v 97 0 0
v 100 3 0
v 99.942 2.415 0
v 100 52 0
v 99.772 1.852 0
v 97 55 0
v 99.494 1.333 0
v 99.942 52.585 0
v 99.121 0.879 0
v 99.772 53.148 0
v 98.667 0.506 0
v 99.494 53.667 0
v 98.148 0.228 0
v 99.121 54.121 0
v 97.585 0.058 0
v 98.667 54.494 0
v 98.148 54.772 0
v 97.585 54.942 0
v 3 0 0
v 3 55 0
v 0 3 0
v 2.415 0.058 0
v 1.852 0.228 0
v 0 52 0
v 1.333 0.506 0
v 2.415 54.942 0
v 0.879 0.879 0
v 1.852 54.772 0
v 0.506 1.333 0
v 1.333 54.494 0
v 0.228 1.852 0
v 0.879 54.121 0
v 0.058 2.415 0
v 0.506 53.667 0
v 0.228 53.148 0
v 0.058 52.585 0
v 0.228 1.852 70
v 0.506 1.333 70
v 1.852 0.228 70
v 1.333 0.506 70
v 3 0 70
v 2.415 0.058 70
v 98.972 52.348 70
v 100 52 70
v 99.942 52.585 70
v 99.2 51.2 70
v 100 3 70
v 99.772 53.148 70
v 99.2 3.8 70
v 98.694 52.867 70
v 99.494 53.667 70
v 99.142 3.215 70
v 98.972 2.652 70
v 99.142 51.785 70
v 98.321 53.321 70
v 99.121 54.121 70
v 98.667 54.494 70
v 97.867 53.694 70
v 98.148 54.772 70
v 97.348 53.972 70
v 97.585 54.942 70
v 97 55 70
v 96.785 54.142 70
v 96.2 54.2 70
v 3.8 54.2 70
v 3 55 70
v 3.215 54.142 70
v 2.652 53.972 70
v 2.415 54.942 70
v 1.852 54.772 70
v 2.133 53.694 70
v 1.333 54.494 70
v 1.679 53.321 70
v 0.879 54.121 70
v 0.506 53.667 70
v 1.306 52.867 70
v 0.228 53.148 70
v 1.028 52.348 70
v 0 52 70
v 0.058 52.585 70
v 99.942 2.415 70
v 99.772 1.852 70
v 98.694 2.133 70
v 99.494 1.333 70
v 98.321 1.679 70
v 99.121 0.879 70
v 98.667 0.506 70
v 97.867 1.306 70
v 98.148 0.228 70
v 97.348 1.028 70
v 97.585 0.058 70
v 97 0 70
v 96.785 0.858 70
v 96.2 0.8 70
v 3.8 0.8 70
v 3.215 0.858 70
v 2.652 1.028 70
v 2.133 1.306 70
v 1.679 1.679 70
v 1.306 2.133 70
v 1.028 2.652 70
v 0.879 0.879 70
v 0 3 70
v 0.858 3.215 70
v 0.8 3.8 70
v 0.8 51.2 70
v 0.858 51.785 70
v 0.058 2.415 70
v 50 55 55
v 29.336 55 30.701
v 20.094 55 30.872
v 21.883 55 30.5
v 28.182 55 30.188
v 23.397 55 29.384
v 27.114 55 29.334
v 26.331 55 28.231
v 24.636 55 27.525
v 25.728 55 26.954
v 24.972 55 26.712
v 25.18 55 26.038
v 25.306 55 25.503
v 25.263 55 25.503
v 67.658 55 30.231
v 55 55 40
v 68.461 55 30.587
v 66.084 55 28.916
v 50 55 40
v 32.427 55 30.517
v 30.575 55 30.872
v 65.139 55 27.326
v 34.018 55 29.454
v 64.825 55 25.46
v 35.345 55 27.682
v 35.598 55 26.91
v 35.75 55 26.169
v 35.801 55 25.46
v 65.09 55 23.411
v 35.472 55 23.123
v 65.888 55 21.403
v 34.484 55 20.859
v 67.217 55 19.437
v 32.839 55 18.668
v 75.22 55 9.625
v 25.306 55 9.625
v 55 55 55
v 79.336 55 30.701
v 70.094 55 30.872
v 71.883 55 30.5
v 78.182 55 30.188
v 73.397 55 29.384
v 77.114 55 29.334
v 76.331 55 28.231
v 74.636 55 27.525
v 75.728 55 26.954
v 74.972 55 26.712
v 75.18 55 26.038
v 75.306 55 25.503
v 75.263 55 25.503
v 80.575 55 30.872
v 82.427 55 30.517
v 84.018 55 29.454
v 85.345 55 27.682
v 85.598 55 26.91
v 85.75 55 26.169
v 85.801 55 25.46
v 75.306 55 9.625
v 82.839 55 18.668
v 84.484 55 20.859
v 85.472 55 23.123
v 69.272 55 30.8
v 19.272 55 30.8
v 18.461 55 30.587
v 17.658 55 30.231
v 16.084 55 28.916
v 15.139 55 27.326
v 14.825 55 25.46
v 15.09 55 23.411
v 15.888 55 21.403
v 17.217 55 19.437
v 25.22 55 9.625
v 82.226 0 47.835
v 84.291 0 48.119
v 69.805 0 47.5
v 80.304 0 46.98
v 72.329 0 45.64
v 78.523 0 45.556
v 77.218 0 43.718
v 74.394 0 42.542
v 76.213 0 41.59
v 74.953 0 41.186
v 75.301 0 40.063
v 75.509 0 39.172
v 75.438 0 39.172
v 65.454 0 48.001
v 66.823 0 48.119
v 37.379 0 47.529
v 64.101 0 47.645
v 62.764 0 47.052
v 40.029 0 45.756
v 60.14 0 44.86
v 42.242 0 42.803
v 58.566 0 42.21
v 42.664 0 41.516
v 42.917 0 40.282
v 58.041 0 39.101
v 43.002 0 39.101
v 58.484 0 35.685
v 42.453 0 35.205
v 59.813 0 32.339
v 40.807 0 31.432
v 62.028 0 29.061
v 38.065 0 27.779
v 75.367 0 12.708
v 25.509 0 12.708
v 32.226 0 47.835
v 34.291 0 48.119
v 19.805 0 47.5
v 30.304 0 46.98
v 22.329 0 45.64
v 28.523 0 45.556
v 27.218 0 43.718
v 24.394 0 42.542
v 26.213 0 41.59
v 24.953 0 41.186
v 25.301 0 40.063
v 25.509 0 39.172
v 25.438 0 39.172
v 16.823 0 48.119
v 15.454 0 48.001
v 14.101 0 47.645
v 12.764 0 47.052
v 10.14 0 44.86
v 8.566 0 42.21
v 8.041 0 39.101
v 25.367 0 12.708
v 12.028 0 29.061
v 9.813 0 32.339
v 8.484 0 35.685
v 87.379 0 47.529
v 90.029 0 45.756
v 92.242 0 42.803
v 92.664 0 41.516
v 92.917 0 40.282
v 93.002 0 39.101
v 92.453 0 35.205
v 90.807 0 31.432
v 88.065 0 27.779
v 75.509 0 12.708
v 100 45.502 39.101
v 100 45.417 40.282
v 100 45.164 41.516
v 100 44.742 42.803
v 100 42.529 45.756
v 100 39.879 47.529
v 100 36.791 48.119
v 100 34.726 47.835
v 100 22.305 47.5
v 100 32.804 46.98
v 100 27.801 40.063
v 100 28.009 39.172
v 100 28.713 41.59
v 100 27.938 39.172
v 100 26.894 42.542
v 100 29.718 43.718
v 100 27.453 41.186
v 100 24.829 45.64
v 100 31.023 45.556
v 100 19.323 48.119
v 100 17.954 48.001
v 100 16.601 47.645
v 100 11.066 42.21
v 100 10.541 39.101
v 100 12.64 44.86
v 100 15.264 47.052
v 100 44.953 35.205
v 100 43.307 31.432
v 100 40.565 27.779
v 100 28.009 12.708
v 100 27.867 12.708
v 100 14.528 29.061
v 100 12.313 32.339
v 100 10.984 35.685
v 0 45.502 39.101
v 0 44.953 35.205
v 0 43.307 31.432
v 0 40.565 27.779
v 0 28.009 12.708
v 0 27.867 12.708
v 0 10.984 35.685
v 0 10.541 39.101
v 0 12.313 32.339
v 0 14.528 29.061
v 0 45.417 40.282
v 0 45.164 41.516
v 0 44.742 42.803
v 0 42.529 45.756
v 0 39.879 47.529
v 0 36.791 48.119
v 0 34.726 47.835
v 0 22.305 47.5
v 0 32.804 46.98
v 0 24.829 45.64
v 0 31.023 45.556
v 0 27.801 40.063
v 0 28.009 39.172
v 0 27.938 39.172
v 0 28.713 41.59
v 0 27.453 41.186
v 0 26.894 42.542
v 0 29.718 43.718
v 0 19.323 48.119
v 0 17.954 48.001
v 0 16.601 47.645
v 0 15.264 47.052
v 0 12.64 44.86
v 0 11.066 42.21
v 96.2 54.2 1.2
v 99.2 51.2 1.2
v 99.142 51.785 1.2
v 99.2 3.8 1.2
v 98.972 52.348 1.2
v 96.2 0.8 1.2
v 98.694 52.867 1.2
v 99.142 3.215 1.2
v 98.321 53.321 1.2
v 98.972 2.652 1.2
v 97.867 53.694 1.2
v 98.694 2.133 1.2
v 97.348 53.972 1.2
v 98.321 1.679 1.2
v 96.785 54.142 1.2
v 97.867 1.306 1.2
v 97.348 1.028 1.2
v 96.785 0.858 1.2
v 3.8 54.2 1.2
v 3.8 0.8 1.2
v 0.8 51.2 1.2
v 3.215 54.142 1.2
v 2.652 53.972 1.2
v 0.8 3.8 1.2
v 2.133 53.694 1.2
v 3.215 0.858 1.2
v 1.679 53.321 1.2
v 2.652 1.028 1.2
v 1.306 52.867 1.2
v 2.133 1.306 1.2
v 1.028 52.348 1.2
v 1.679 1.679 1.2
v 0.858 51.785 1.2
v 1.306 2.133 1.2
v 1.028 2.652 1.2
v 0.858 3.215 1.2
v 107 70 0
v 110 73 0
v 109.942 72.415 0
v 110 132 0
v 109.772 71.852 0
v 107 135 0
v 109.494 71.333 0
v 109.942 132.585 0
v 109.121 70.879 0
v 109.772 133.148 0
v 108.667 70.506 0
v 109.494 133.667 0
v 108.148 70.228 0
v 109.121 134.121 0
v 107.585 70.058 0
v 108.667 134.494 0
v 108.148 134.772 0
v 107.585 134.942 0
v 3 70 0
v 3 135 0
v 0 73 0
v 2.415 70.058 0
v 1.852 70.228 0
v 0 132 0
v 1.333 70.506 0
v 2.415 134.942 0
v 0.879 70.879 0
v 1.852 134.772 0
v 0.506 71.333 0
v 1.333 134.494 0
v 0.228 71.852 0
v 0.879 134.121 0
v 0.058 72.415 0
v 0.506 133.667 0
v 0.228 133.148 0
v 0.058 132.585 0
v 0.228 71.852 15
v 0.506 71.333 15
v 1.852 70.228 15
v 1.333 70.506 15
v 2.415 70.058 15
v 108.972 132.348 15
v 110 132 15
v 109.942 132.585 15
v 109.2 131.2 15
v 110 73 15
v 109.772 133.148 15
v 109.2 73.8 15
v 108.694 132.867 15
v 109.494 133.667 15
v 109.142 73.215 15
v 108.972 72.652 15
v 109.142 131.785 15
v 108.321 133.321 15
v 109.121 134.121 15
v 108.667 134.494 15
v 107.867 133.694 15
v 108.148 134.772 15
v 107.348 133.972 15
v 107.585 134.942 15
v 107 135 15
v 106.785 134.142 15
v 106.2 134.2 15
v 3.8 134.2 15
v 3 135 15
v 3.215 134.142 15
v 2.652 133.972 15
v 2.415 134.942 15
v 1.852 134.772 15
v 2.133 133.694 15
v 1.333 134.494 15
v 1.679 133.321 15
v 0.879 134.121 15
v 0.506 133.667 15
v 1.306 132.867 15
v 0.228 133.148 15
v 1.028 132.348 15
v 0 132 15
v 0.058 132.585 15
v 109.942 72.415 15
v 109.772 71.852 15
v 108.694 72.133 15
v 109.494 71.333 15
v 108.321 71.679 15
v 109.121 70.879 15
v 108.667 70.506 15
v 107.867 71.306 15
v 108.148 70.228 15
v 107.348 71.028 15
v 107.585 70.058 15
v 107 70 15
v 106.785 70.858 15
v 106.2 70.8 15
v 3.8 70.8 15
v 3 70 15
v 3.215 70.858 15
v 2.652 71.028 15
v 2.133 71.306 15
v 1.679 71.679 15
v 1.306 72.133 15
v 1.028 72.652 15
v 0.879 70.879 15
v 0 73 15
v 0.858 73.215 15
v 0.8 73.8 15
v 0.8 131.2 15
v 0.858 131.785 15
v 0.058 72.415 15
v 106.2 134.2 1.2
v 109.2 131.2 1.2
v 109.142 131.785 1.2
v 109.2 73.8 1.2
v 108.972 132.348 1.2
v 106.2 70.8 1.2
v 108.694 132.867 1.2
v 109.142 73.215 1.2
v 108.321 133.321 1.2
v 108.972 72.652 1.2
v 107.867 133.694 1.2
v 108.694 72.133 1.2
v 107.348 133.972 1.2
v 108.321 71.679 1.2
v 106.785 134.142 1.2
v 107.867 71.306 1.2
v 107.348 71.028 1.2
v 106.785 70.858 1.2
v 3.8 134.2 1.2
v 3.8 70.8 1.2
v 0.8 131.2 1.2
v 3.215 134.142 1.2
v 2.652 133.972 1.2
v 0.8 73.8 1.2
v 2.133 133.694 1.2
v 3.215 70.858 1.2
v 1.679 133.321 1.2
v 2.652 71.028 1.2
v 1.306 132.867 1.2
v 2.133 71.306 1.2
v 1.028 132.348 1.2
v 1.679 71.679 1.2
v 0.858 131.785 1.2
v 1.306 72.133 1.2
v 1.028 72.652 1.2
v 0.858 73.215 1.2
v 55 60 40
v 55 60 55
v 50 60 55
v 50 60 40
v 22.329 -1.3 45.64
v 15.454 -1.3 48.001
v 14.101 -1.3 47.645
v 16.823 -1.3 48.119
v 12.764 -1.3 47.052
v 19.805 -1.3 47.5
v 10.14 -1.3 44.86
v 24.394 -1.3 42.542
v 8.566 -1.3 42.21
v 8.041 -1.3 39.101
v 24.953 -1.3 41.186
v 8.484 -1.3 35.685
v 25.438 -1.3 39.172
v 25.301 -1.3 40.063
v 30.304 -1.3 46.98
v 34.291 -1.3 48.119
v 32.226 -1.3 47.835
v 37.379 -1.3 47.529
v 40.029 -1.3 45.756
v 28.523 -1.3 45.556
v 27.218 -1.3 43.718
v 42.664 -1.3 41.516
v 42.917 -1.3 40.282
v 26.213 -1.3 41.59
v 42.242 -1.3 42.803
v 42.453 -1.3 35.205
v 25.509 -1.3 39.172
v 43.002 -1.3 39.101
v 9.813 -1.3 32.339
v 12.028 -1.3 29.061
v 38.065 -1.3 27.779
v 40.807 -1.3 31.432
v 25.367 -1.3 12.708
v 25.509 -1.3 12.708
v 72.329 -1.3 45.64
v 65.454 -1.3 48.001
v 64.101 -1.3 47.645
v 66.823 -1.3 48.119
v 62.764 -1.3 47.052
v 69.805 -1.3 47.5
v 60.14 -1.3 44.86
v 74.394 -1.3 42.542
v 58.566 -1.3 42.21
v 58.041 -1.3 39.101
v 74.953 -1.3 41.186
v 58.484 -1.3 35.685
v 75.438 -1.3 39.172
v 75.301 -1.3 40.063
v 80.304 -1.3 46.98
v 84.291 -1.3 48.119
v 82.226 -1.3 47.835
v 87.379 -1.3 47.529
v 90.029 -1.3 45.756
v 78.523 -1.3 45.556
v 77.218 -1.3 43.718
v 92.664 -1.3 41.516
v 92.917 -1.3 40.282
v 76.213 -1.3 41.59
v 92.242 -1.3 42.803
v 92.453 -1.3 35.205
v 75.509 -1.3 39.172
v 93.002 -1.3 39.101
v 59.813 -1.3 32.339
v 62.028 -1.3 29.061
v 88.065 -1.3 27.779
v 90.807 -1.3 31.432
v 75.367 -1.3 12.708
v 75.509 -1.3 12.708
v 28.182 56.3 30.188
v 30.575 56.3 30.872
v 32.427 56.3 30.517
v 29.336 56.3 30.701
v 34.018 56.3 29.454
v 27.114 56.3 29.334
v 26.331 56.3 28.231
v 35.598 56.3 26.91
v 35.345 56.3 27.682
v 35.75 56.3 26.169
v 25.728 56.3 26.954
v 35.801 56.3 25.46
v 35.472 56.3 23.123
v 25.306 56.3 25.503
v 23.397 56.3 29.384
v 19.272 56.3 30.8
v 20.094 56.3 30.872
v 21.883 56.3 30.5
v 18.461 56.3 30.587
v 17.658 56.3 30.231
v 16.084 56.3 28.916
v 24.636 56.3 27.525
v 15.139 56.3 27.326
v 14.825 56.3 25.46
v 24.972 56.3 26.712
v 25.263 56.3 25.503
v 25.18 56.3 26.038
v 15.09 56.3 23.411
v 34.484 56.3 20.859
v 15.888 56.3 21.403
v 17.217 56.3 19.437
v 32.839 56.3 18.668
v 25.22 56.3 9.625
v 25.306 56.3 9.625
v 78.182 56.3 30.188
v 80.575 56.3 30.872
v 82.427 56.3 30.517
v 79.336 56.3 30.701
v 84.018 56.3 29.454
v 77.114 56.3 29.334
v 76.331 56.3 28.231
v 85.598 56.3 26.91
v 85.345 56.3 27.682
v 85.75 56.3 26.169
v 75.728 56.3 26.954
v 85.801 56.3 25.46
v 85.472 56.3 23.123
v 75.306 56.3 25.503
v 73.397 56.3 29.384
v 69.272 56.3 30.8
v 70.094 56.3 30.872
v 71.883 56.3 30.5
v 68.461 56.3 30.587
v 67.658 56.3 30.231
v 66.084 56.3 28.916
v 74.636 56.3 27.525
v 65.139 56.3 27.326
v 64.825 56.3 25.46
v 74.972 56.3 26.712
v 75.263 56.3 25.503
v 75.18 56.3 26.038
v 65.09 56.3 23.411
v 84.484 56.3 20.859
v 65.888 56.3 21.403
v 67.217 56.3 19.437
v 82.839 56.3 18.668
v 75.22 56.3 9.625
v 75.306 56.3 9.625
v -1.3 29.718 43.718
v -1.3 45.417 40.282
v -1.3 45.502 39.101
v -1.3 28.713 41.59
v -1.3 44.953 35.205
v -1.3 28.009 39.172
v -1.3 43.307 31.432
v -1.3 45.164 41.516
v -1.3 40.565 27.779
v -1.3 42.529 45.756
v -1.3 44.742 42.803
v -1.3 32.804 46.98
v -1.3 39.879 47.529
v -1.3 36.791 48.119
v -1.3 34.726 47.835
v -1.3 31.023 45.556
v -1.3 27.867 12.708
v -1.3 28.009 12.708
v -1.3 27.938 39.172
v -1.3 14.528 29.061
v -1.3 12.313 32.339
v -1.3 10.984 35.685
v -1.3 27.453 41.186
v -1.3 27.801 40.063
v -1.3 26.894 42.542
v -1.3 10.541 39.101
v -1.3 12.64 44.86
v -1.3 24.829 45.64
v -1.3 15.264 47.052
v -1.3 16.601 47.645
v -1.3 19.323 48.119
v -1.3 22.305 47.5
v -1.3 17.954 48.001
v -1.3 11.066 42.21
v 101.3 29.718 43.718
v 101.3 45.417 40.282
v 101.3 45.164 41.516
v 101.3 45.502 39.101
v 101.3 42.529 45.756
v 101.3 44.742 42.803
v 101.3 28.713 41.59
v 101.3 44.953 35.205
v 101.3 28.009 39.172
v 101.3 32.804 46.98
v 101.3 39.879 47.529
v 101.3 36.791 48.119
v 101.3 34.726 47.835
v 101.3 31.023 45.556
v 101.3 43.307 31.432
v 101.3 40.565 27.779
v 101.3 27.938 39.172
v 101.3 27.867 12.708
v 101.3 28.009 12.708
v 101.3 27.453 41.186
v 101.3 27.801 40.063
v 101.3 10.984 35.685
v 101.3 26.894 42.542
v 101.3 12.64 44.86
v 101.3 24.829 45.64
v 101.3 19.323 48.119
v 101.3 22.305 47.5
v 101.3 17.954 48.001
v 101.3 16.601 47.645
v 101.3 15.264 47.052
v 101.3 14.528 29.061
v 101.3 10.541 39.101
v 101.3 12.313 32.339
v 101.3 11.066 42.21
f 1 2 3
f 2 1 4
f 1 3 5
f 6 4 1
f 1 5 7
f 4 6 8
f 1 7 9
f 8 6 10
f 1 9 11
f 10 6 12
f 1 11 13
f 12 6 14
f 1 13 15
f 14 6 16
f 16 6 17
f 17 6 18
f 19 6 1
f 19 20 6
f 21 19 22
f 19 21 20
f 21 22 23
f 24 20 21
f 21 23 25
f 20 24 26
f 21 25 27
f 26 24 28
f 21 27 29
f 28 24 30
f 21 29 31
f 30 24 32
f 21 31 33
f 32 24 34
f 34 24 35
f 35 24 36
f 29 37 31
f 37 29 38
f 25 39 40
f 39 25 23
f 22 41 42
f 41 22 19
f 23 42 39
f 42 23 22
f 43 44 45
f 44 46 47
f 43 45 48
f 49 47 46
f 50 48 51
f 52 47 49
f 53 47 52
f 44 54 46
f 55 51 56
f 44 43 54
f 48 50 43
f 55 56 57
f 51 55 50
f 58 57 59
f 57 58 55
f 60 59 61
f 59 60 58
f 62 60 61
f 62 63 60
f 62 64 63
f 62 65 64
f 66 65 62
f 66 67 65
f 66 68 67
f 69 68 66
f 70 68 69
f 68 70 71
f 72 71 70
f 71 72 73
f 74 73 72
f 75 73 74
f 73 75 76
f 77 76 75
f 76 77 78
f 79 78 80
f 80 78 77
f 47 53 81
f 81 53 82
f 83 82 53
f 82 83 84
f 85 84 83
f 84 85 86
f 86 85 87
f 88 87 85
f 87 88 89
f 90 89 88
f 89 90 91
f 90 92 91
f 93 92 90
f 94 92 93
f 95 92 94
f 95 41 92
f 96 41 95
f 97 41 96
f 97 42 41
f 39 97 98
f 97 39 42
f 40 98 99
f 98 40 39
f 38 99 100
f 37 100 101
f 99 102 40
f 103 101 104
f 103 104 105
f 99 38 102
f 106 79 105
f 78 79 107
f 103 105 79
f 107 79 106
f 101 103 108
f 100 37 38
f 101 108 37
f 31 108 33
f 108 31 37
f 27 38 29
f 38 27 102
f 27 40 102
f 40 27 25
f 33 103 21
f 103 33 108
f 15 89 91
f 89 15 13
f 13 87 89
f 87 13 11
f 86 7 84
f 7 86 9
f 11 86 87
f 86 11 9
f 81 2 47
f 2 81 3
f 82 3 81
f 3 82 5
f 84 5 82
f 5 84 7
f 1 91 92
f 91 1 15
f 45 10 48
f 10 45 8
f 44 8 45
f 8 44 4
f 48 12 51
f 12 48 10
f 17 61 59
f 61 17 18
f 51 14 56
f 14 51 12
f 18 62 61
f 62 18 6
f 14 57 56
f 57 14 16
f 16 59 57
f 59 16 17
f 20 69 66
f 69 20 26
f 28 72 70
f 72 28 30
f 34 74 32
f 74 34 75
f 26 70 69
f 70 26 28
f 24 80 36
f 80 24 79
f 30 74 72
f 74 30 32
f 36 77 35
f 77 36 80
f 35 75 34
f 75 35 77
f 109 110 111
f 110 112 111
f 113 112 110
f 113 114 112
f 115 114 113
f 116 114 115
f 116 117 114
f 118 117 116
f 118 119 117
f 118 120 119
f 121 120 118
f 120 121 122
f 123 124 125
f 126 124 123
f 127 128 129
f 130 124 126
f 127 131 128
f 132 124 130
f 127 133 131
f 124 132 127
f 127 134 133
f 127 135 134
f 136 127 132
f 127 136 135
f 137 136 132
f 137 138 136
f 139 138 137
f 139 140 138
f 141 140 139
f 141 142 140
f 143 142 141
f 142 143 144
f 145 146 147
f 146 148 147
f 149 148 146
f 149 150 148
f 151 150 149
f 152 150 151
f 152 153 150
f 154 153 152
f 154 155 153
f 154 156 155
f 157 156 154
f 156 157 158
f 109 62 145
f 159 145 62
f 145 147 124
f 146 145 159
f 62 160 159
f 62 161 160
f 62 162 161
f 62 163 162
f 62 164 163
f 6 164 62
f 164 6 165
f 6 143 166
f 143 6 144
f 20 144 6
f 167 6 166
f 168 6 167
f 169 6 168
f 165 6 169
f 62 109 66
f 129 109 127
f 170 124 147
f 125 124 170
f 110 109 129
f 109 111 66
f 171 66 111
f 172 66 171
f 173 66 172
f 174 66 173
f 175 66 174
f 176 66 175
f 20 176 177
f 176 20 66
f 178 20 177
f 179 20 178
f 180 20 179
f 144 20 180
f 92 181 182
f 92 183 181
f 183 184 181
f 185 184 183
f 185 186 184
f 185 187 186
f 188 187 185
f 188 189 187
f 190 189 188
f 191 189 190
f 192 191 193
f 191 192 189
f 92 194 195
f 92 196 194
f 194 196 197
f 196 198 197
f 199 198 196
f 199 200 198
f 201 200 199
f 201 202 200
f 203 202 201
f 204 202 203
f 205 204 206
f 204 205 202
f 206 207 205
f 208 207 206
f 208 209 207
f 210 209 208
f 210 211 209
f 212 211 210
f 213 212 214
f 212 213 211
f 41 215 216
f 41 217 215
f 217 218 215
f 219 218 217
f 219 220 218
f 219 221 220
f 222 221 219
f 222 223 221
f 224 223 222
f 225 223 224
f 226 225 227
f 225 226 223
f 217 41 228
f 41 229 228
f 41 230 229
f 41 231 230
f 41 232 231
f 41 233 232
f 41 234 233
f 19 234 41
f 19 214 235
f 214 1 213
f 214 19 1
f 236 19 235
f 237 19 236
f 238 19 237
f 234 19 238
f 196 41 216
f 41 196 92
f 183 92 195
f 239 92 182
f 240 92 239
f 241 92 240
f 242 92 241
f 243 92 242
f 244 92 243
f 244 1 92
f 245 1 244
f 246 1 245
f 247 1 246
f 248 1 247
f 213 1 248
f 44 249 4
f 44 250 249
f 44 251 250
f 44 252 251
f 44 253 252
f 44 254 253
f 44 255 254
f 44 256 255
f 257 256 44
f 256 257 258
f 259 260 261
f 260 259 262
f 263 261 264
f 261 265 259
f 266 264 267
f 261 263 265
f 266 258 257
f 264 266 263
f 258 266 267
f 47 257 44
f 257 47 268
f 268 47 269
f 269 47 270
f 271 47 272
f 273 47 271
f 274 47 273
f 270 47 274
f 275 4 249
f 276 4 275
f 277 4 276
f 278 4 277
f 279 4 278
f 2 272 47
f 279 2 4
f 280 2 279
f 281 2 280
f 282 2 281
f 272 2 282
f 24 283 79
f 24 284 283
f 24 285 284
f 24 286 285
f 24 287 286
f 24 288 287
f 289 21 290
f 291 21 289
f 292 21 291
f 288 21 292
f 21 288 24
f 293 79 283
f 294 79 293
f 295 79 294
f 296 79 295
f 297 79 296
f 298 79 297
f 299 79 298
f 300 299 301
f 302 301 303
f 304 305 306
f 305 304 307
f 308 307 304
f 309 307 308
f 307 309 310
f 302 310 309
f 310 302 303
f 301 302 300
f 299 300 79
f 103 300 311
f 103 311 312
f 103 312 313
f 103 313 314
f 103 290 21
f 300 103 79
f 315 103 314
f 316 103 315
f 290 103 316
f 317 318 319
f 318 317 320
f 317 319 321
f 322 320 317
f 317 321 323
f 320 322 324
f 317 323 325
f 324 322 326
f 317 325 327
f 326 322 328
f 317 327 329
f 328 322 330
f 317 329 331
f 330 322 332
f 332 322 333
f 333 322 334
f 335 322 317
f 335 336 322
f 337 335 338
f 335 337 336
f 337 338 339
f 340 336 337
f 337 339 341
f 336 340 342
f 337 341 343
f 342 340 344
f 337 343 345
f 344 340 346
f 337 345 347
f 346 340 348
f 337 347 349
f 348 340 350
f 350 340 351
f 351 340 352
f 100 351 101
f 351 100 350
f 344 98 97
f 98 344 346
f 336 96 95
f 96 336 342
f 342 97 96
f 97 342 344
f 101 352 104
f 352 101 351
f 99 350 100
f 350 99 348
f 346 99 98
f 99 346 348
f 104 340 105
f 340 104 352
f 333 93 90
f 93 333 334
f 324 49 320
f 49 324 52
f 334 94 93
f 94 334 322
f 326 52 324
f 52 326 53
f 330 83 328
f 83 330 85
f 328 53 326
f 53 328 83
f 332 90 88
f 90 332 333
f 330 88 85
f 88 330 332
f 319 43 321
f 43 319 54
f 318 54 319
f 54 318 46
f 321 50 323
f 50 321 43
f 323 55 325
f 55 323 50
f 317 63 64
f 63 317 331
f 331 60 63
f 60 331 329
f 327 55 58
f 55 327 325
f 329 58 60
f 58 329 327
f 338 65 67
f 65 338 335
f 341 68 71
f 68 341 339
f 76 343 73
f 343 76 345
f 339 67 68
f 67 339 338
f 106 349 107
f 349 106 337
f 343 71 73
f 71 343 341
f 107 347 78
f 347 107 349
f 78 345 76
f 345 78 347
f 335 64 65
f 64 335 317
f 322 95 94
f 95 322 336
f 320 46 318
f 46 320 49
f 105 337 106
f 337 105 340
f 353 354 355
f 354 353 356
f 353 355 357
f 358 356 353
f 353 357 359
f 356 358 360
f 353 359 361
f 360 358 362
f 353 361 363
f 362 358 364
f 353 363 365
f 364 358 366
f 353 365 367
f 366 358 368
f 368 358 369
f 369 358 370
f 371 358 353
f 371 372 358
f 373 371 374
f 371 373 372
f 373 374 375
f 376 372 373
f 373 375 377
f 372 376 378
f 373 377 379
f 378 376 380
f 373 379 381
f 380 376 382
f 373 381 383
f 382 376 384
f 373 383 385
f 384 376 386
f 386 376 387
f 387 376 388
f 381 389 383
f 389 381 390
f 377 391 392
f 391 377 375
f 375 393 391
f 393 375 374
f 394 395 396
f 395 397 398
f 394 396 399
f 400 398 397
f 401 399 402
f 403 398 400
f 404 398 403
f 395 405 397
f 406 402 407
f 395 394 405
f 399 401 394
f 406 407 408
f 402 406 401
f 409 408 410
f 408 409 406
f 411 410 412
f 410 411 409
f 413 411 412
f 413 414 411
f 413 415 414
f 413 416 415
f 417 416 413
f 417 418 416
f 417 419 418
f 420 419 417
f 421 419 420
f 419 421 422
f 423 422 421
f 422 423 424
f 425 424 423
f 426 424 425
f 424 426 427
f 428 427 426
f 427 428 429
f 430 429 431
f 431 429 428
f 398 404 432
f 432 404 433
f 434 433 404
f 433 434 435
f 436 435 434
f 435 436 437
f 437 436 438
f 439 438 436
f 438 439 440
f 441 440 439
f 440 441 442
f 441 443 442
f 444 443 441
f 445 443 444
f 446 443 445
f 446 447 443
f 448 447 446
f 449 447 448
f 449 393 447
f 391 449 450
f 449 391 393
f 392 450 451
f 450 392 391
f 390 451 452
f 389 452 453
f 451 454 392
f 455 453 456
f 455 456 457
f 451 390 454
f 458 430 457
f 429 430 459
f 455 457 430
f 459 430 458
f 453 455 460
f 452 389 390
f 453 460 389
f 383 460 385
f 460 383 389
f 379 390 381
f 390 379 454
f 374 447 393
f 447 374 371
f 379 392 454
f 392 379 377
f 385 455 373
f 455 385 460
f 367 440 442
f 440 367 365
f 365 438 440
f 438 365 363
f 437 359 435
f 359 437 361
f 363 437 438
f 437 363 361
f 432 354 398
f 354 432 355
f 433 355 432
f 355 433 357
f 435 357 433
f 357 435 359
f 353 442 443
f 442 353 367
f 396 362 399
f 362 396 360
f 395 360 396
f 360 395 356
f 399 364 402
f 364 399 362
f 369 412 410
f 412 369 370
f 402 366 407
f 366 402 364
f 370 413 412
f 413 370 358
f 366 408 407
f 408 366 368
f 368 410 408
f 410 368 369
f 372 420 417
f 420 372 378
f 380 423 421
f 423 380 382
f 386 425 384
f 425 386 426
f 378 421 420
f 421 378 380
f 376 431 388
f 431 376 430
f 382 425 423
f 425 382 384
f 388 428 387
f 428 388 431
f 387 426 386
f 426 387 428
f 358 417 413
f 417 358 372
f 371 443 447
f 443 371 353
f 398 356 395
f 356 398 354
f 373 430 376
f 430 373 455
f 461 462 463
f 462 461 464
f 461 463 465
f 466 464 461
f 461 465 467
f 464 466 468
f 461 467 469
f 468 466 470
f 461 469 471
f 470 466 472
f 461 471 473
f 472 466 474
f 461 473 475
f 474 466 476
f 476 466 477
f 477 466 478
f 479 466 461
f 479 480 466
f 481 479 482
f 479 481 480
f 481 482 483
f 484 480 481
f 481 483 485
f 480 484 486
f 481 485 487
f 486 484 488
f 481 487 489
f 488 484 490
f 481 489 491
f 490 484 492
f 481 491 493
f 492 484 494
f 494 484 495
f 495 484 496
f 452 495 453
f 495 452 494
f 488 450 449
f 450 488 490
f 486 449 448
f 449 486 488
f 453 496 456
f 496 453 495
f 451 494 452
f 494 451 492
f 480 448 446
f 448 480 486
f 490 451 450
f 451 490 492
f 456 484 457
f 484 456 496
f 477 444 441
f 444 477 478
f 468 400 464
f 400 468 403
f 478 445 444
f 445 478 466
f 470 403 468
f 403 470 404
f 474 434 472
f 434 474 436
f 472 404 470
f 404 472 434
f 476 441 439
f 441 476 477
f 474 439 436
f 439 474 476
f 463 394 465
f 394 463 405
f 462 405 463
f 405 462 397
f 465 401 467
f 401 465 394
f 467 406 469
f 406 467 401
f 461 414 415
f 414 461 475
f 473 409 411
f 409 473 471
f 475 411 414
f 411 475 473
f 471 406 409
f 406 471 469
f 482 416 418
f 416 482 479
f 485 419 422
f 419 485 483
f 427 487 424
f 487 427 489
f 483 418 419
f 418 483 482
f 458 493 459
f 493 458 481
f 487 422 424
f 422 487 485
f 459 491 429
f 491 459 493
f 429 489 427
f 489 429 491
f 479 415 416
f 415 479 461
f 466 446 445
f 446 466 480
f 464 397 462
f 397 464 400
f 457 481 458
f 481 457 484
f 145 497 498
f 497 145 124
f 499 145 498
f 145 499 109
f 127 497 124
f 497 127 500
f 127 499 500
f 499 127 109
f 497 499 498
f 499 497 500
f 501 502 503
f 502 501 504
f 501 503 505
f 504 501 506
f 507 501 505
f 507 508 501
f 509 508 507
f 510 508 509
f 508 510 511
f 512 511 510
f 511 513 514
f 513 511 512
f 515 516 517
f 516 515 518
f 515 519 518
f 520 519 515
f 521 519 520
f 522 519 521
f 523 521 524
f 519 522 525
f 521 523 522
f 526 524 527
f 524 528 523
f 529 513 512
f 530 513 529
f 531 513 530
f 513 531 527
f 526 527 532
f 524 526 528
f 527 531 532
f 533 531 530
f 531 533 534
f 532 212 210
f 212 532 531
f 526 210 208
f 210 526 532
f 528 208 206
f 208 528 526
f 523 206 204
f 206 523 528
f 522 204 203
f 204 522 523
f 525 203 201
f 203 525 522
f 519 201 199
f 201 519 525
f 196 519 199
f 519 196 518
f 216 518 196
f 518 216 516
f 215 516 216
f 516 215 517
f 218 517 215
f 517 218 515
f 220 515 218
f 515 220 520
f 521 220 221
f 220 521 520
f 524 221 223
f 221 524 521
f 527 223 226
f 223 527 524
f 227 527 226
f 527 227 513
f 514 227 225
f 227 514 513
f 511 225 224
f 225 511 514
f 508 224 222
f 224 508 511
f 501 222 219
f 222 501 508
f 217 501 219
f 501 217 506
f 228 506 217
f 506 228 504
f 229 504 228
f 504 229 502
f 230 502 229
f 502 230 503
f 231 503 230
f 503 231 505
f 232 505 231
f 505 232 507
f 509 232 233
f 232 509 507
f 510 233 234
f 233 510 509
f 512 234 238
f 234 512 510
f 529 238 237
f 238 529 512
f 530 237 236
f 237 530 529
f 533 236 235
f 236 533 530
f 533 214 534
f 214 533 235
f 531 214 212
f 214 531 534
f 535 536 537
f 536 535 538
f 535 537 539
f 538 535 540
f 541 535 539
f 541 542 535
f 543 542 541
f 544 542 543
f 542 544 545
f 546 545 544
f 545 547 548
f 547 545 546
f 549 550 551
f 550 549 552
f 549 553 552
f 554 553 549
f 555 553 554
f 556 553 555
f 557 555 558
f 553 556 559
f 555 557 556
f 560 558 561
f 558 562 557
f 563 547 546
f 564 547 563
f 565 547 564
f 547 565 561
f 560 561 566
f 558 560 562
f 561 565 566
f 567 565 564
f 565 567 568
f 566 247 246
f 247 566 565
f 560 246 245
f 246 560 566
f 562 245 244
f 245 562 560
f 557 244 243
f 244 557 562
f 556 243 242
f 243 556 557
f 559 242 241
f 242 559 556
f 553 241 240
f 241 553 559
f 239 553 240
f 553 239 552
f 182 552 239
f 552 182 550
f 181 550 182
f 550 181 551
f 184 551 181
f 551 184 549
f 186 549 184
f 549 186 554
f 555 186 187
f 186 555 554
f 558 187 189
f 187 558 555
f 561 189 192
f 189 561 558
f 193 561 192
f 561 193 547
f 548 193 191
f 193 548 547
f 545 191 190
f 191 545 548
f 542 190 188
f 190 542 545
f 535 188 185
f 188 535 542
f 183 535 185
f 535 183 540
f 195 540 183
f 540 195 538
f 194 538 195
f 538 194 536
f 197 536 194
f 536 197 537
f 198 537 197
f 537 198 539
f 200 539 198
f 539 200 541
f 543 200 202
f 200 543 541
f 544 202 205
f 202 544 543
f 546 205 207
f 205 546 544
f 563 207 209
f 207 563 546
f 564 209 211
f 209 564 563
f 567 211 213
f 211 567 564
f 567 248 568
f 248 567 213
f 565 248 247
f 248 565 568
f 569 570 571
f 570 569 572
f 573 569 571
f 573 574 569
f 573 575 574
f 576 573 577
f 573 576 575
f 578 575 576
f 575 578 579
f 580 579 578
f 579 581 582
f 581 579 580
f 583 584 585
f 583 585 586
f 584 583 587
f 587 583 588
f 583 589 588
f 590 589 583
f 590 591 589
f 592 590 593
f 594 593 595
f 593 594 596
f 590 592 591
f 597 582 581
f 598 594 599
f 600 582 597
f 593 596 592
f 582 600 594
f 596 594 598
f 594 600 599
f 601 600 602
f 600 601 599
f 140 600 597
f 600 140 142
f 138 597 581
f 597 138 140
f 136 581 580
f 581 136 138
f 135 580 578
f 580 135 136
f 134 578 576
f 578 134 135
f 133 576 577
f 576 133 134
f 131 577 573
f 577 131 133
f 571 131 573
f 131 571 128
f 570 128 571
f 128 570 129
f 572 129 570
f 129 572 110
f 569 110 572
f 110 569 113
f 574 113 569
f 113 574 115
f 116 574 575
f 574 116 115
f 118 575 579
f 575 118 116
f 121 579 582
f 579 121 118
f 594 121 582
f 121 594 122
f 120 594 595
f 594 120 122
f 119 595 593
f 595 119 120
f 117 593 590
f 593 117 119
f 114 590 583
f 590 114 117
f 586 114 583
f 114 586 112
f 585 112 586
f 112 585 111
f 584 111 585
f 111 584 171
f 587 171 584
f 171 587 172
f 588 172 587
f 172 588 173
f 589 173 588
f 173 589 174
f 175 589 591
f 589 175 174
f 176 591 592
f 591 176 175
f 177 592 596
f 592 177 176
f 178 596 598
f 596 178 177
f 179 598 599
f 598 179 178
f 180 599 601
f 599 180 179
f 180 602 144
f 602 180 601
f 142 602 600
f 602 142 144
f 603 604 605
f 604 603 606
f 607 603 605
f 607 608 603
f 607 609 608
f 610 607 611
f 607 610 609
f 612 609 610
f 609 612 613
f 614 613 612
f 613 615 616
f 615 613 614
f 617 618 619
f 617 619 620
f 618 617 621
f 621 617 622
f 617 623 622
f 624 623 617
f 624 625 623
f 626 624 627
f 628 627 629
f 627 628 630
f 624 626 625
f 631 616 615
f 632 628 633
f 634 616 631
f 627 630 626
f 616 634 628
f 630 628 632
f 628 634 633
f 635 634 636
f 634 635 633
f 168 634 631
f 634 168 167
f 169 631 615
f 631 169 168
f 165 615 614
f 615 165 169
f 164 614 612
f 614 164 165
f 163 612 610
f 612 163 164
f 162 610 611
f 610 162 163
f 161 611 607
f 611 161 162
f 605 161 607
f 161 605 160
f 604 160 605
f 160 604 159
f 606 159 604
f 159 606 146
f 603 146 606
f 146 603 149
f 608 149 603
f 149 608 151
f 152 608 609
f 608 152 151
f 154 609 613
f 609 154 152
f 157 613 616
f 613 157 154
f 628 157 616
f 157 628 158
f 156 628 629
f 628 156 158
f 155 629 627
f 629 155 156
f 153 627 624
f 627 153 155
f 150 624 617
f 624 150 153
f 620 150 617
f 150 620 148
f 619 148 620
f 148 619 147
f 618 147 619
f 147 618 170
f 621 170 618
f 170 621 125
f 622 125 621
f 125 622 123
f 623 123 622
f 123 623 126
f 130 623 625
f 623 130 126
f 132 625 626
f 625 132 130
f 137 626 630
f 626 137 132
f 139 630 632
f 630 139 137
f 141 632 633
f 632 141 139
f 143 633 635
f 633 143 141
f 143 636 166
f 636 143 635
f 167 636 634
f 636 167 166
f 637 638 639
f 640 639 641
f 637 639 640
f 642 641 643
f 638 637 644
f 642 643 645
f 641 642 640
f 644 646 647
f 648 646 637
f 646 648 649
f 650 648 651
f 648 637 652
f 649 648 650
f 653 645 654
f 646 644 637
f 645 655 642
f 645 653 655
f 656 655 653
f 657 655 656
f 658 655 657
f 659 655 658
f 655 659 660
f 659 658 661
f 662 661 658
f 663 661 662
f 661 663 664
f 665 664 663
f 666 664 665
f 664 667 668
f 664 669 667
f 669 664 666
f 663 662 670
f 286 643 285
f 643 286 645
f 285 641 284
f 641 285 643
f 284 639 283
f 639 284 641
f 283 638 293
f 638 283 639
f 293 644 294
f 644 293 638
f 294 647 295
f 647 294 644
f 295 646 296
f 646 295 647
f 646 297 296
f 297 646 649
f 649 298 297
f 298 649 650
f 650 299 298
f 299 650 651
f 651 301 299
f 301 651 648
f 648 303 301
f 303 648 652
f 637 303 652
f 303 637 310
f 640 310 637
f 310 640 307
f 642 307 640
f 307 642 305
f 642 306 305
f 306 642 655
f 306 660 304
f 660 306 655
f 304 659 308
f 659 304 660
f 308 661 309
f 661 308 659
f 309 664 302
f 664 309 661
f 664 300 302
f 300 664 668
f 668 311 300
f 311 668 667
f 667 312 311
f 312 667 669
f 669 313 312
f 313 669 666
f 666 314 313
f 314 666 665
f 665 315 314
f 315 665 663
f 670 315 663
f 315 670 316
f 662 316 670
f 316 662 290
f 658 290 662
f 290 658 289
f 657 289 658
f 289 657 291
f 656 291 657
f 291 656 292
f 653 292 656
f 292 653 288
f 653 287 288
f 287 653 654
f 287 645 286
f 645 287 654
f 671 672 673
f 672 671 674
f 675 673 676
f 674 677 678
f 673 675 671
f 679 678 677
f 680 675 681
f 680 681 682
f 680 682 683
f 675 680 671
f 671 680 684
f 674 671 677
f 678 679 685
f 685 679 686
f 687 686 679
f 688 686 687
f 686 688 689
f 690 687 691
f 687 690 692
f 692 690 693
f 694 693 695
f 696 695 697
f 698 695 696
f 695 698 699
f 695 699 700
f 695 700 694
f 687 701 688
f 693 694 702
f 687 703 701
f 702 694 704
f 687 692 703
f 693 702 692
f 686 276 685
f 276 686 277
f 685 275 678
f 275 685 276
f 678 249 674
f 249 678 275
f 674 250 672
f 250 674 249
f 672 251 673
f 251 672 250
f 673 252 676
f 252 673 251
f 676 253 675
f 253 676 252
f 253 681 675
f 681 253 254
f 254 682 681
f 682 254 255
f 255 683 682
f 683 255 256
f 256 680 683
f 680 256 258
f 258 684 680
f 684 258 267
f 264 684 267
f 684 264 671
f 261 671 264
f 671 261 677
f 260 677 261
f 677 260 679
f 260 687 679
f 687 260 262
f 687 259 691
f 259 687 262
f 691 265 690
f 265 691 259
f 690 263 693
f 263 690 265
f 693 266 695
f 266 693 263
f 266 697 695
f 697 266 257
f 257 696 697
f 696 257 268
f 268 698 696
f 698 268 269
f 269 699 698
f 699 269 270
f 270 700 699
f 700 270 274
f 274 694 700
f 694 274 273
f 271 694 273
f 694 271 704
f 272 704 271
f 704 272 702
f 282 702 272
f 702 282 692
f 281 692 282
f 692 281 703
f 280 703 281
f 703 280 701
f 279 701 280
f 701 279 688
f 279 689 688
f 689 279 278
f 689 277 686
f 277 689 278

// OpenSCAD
module rounded_cube(size,r) {
    union()
    {
        height = size[2];
        echo(height);
        translate([r,r,0])
            cylinder(h=height, r=r, $fn=32);
        translate([size[0]-r,r,0])
            cylinder(h=height, r=r, $fn=32);
        translate([size[0]-r,size[1]-r,0])
            cylinder(h=height, r=r, $fn=32);
        translate([r,size[1]-r,0])
            cylinder(h=height, r=r, $fn=32);
        translate([r,0,0])
            cube([size[0]-2*r, size[1], size[2]]);
        translate([0,r,0])
            cube([size[0], size[1]-2*r, size[2]]);
    }
}
module box() {
    union() {
        w=100;
        d=55;
        h=70; 
        th2 = 0.8; //thickness outside
        
        difference() {
            rounded_cube([w,d,h],3);
            translate([th2,th2,1.2])
                rounded_cube([w-2*th2,d-2*th2,h],3);
        }
    }
}
module lid() {
    union() {
        w=110;
        d=65;
        h=15; 
        th2 = 0.8; //thickness outside
        
        difference() {
            rounded_cube([w,d,h],3);
            translate([th2,th2,1.2])
                rounded_cube([w-2*th2,d-2*th2,h],3);
        }
    }
}

module heart() {
    linear_extrude(1,center=true)
        text("♥",7, "Lucida Sans Unicode:style=Regular",halign="center", valign="center");
}

box();
translate([0,70,0])
lid();

translate([50,55,40])
    cube([5,5,15]);

translate([25,-0.3,30])
scale([5,2,5]) rotate([90,0,0])heart();

translate([75,-0.3,30])
scale([5,2,5]) rotate([90,0,0])heart();


translate([25, 55.3,20])
scale([3,2,3]) rotate([90,0,0])heart();

translate([75, 55.3,20])
scale([3,2,3]) rotate([90,0,0])heart();


translate([-0.3,27.5,30])
scale([2,5,5]) rotate([90,0,90])heart();

translate([100.3,27.5,30])
scale([2,5,5]) rotate([90,0,90])heart();
